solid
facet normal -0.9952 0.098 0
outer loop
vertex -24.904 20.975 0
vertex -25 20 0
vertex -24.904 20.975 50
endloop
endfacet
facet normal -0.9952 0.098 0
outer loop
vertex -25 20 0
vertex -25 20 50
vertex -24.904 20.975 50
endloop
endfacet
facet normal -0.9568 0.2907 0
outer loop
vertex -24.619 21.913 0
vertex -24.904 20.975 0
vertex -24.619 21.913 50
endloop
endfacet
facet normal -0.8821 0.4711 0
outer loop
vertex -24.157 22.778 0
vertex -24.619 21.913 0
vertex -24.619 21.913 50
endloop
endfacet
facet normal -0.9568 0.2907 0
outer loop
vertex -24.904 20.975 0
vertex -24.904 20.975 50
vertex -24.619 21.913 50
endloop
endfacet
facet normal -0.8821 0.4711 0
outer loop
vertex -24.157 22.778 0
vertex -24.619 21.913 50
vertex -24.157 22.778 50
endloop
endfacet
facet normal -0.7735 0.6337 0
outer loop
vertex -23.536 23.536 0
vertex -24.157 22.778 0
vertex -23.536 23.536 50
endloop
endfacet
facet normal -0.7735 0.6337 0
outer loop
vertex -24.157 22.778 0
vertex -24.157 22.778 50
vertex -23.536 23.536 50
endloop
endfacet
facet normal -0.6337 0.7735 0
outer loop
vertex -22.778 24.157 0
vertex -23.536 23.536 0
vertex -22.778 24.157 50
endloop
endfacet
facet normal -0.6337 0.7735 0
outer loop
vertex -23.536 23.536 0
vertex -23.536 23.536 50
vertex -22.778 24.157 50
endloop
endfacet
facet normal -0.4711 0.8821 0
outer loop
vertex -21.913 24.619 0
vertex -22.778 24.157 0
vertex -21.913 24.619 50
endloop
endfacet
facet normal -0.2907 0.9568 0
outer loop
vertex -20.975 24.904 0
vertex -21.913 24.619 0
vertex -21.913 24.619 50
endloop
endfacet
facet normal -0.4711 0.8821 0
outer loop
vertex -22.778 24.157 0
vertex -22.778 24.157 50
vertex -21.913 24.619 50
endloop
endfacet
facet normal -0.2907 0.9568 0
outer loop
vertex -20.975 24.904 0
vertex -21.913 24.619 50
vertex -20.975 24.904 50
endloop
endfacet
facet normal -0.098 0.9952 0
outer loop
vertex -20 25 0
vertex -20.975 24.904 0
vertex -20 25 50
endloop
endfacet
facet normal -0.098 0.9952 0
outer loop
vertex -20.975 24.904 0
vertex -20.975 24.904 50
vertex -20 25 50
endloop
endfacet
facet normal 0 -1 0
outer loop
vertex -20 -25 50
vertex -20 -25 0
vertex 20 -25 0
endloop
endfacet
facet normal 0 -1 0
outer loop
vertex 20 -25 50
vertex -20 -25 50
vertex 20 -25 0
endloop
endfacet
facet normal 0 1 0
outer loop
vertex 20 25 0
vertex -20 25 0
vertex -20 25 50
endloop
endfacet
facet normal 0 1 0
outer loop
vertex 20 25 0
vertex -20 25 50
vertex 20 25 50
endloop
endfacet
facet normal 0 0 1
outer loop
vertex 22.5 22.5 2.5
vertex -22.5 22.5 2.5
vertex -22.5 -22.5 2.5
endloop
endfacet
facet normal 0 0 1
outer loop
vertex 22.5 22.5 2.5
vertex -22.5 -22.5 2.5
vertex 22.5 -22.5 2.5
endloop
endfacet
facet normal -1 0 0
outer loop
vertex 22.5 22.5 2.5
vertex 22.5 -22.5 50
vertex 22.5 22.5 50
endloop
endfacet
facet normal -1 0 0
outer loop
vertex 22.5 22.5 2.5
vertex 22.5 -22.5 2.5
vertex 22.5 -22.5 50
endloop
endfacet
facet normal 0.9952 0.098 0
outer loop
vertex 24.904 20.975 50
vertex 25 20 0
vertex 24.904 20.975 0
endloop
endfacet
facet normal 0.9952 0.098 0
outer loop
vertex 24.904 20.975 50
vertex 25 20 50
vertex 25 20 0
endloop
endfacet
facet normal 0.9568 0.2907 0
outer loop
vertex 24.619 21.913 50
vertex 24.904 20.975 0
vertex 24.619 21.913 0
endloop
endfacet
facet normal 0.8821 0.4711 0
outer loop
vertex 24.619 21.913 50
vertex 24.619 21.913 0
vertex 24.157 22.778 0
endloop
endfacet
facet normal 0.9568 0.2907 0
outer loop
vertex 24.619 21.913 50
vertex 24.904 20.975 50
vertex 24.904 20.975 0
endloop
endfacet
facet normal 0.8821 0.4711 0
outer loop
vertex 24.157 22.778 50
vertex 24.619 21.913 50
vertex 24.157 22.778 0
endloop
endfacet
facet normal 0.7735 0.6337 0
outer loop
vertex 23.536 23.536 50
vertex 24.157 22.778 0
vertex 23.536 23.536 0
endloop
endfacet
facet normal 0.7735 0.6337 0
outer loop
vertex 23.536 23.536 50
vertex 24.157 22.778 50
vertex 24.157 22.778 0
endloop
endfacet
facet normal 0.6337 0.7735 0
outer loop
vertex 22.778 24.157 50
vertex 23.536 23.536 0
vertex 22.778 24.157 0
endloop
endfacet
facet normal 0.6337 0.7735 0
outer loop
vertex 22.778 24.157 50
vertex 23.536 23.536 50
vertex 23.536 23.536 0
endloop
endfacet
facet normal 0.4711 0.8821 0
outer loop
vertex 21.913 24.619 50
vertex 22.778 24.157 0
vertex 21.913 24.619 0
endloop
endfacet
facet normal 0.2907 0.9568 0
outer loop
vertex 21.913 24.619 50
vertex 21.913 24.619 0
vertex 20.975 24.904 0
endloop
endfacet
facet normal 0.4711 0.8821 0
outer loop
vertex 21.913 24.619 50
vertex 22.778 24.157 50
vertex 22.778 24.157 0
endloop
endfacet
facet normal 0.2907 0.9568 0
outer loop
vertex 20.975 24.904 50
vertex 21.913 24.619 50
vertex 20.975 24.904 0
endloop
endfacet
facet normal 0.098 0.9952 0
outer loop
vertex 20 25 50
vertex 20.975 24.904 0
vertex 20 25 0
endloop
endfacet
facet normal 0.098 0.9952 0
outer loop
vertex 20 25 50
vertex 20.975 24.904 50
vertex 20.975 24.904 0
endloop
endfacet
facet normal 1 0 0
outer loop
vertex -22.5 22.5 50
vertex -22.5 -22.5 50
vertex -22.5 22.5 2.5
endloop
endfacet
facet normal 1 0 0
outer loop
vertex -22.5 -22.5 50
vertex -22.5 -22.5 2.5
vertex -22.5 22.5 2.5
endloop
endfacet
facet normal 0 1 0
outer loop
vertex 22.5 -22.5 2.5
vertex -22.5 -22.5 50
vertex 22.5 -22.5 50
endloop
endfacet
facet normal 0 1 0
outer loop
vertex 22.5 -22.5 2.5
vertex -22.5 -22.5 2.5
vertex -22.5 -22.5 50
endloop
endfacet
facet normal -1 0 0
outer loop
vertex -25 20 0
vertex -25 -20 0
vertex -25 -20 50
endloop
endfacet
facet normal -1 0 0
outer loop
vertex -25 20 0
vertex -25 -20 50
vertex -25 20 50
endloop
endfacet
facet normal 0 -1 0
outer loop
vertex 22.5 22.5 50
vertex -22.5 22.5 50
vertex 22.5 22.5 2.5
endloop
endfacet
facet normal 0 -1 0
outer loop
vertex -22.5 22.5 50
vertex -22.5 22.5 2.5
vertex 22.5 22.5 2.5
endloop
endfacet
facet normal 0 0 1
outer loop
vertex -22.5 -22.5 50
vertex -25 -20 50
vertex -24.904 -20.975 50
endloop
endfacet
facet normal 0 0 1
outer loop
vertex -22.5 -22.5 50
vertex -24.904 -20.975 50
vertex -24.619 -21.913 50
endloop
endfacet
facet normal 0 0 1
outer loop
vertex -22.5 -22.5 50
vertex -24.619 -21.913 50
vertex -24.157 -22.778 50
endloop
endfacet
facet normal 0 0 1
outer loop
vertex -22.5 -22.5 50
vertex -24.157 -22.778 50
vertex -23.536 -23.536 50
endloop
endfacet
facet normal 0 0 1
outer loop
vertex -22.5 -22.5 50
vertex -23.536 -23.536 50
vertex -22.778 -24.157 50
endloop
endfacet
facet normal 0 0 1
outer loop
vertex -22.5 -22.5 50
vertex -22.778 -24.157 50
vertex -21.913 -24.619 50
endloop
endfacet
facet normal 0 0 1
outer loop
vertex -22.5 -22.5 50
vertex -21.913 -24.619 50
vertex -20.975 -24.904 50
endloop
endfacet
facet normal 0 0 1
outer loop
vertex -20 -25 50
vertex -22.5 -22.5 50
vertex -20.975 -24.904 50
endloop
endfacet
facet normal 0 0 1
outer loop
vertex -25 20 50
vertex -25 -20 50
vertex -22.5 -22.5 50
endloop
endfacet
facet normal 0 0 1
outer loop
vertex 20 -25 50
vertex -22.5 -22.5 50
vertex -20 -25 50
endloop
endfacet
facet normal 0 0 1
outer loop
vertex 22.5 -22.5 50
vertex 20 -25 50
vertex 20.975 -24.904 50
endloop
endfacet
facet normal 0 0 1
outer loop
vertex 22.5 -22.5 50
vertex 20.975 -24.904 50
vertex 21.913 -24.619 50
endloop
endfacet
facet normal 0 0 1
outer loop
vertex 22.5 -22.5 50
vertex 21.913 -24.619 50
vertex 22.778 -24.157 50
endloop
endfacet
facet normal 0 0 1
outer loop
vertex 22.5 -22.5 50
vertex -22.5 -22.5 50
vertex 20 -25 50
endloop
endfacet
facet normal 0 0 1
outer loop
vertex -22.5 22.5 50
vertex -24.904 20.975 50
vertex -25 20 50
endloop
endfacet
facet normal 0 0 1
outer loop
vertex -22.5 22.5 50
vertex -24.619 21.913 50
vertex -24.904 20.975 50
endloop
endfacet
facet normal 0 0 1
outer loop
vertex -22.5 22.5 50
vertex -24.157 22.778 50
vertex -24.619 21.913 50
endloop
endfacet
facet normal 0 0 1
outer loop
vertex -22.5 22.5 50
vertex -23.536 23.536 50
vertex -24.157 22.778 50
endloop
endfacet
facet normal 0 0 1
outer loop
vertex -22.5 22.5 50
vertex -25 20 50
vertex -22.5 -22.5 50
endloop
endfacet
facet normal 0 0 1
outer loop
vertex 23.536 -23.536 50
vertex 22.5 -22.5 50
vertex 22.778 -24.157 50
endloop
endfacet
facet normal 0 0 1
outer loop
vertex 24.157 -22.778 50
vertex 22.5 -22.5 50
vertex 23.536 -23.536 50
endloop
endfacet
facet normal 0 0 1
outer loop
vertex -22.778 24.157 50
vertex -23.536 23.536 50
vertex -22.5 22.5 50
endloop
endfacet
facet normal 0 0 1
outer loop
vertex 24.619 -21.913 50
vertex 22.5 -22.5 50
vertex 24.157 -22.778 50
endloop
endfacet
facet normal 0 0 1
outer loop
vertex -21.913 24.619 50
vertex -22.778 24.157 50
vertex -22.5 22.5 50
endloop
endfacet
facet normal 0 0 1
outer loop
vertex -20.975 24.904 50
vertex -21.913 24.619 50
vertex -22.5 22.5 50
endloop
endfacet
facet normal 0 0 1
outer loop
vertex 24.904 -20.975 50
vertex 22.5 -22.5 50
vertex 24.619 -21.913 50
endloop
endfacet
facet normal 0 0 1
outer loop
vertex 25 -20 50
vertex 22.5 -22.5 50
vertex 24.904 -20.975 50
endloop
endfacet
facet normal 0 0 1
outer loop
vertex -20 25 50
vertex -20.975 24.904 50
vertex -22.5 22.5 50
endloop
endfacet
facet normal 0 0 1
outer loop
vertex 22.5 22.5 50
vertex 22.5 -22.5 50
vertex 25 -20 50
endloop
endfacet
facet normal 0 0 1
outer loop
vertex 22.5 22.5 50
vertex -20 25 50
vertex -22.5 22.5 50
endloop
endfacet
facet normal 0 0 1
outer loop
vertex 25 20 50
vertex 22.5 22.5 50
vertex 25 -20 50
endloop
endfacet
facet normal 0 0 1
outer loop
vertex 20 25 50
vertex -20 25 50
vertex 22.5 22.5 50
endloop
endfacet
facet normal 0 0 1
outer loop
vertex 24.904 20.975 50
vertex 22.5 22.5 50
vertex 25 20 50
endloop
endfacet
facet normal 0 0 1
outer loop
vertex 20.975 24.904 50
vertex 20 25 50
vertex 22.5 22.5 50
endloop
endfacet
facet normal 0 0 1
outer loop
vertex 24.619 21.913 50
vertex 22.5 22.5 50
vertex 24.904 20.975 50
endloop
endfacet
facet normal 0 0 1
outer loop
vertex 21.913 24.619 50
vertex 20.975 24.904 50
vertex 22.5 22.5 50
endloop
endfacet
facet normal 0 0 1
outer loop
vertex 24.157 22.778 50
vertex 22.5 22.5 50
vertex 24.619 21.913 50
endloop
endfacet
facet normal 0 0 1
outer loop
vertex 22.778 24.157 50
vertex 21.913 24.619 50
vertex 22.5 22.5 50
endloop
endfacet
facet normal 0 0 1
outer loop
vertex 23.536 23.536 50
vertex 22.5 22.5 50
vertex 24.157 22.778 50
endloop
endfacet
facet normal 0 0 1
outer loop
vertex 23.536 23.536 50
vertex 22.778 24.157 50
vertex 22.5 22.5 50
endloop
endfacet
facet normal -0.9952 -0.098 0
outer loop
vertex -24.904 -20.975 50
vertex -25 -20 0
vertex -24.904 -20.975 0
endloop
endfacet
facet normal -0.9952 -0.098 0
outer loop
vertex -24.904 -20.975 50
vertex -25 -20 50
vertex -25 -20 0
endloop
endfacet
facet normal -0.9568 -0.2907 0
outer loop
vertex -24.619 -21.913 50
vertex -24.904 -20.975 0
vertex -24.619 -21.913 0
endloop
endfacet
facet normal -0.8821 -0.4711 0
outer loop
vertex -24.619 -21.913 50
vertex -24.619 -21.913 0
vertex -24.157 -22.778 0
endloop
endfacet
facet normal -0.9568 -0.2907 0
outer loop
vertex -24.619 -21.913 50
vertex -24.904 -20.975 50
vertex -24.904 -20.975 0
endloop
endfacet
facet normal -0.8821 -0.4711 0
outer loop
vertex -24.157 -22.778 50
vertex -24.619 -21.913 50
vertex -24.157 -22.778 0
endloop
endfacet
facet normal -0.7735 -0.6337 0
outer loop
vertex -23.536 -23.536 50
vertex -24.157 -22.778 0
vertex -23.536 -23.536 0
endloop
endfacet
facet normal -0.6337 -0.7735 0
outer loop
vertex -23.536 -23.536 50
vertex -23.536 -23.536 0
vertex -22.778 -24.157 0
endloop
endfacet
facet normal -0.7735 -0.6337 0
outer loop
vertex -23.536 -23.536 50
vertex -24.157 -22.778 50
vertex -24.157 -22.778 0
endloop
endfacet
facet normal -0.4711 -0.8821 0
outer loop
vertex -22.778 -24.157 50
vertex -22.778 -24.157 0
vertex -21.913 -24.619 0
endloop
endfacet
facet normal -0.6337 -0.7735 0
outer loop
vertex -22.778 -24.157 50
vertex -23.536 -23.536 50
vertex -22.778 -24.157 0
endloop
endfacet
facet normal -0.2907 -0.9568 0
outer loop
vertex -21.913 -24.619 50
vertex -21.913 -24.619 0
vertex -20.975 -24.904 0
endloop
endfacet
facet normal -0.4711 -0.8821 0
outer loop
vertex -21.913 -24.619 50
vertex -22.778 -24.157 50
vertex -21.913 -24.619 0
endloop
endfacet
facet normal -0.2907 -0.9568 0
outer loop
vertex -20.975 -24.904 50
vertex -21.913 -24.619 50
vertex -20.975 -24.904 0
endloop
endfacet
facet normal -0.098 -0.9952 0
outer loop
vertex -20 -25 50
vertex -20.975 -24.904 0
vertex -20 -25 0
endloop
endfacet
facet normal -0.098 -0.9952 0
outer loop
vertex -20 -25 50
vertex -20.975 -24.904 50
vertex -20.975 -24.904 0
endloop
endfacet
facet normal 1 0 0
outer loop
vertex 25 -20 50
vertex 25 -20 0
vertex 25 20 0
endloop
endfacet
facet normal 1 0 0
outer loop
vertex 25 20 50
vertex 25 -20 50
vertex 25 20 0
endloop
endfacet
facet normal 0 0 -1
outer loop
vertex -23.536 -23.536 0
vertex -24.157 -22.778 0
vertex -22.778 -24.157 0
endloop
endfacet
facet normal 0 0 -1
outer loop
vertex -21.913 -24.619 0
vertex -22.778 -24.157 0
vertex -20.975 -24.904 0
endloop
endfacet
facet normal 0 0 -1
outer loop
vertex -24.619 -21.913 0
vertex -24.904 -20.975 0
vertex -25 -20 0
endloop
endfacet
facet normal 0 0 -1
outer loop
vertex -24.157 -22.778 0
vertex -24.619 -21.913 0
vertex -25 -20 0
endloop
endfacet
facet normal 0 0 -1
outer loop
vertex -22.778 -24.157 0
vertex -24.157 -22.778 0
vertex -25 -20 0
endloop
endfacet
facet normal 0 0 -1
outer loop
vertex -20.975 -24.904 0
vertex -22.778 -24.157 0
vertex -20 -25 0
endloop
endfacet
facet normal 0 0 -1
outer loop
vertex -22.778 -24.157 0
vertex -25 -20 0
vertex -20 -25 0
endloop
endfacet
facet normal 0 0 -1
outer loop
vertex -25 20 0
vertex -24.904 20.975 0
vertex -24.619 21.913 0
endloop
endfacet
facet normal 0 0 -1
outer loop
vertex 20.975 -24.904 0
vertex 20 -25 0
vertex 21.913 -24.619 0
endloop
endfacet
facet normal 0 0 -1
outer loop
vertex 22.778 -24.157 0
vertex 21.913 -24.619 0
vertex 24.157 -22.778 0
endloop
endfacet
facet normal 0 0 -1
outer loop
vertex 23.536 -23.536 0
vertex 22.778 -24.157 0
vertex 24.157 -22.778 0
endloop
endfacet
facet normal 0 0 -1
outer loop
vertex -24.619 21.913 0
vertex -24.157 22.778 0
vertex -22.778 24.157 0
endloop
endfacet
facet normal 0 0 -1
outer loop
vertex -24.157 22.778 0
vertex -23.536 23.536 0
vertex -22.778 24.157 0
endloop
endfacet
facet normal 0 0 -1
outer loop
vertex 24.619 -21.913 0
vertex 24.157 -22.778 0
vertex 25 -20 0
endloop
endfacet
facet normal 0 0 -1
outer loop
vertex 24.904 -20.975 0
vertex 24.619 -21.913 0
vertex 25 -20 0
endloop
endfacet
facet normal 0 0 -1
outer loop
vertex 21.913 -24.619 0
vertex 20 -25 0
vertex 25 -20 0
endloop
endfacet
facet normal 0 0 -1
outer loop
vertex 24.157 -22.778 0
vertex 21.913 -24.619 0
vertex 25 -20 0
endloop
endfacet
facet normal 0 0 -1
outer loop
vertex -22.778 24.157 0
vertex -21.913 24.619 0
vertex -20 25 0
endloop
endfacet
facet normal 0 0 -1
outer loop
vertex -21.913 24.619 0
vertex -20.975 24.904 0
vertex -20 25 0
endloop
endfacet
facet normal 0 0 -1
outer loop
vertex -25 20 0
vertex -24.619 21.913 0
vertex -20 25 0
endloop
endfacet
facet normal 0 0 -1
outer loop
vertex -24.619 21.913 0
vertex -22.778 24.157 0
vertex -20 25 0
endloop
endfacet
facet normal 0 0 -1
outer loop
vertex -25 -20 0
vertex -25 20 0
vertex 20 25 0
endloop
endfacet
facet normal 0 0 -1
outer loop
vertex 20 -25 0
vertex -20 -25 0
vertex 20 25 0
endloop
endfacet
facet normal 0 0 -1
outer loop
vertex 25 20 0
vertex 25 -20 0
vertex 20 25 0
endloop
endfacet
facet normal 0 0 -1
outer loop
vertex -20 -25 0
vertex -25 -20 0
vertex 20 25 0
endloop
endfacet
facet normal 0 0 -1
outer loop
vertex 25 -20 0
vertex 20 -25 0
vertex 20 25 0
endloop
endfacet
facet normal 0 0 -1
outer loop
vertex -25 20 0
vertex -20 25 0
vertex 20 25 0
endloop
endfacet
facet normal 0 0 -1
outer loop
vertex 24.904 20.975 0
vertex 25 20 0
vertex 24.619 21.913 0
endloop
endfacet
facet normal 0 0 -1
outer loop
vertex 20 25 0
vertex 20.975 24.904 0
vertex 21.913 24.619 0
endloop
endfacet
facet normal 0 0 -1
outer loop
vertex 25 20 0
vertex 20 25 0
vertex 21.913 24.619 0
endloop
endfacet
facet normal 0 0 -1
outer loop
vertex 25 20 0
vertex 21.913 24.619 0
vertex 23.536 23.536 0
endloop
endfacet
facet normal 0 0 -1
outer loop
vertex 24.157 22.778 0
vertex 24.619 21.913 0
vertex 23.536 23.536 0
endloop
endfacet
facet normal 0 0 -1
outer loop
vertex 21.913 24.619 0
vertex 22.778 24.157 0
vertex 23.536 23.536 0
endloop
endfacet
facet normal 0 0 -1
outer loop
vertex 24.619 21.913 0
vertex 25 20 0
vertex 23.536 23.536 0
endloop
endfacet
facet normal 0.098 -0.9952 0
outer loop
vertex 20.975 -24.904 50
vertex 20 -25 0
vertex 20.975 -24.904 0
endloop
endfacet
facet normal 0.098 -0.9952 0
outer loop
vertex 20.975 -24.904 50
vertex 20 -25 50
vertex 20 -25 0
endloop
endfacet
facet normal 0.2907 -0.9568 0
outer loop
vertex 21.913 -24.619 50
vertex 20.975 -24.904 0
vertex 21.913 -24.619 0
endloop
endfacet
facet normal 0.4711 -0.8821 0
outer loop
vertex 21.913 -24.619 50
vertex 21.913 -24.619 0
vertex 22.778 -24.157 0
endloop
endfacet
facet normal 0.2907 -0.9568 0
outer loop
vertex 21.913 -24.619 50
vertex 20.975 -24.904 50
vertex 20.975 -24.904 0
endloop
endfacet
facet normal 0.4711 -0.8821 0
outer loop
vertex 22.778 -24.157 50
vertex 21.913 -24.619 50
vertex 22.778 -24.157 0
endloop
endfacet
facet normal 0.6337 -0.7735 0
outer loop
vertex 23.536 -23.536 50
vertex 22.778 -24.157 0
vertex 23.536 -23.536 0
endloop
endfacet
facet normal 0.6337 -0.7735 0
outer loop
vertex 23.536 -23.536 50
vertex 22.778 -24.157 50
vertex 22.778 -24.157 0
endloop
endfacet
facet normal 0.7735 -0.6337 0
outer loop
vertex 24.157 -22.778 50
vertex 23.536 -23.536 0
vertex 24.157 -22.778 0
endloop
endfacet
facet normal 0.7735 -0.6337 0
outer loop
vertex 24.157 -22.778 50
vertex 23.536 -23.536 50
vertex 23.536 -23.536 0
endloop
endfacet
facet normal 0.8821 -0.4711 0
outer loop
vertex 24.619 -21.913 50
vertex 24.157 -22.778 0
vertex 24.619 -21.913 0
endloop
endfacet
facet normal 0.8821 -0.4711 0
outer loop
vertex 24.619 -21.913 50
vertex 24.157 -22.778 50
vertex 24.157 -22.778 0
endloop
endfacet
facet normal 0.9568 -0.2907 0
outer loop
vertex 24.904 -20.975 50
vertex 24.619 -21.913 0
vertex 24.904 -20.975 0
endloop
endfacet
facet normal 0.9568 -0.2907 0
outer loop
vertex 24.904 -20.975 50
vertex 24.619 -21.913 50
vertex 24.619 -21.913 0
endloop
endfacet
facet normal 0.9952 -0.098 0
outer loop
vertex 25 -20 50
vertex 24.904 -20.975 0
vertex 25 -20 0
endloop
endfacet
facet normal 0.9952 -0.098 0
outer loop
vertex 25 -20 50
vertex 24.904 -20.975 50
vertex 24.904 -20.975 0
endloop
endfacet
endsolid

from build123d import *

# Parameters (mm, degrees)
F0_W     = 50
F0_H     = 50
F1_DEPTH = 50
F2_T     = -2.5
F3_R     = 5


with BuildPart() as f1:
    # F0 (on Top) → F1 (new body)
    with BuildSketch(Plane.XY):
        Rectangle(F0_W, F0_H)
    extrude(amount=F1_DEPTH)

    # F2
    f2_openings = [f1.faces().sort_by_distance(p)[0] for p in [
        (0, 0, 50),
    ]]
    offset(amount=F2_T, openings=f2_openings)

    # F3
    f3_edges = [f1.edges().sort_by_distance(p)[0] for p in [
        (-25, -25, 25),
        (25, -25, 25),
        (25, 25, 25),
        (-25, 25, 25),
    ]]
    fillet(f3_edges, radius=F3_R)


solid = f1.part
